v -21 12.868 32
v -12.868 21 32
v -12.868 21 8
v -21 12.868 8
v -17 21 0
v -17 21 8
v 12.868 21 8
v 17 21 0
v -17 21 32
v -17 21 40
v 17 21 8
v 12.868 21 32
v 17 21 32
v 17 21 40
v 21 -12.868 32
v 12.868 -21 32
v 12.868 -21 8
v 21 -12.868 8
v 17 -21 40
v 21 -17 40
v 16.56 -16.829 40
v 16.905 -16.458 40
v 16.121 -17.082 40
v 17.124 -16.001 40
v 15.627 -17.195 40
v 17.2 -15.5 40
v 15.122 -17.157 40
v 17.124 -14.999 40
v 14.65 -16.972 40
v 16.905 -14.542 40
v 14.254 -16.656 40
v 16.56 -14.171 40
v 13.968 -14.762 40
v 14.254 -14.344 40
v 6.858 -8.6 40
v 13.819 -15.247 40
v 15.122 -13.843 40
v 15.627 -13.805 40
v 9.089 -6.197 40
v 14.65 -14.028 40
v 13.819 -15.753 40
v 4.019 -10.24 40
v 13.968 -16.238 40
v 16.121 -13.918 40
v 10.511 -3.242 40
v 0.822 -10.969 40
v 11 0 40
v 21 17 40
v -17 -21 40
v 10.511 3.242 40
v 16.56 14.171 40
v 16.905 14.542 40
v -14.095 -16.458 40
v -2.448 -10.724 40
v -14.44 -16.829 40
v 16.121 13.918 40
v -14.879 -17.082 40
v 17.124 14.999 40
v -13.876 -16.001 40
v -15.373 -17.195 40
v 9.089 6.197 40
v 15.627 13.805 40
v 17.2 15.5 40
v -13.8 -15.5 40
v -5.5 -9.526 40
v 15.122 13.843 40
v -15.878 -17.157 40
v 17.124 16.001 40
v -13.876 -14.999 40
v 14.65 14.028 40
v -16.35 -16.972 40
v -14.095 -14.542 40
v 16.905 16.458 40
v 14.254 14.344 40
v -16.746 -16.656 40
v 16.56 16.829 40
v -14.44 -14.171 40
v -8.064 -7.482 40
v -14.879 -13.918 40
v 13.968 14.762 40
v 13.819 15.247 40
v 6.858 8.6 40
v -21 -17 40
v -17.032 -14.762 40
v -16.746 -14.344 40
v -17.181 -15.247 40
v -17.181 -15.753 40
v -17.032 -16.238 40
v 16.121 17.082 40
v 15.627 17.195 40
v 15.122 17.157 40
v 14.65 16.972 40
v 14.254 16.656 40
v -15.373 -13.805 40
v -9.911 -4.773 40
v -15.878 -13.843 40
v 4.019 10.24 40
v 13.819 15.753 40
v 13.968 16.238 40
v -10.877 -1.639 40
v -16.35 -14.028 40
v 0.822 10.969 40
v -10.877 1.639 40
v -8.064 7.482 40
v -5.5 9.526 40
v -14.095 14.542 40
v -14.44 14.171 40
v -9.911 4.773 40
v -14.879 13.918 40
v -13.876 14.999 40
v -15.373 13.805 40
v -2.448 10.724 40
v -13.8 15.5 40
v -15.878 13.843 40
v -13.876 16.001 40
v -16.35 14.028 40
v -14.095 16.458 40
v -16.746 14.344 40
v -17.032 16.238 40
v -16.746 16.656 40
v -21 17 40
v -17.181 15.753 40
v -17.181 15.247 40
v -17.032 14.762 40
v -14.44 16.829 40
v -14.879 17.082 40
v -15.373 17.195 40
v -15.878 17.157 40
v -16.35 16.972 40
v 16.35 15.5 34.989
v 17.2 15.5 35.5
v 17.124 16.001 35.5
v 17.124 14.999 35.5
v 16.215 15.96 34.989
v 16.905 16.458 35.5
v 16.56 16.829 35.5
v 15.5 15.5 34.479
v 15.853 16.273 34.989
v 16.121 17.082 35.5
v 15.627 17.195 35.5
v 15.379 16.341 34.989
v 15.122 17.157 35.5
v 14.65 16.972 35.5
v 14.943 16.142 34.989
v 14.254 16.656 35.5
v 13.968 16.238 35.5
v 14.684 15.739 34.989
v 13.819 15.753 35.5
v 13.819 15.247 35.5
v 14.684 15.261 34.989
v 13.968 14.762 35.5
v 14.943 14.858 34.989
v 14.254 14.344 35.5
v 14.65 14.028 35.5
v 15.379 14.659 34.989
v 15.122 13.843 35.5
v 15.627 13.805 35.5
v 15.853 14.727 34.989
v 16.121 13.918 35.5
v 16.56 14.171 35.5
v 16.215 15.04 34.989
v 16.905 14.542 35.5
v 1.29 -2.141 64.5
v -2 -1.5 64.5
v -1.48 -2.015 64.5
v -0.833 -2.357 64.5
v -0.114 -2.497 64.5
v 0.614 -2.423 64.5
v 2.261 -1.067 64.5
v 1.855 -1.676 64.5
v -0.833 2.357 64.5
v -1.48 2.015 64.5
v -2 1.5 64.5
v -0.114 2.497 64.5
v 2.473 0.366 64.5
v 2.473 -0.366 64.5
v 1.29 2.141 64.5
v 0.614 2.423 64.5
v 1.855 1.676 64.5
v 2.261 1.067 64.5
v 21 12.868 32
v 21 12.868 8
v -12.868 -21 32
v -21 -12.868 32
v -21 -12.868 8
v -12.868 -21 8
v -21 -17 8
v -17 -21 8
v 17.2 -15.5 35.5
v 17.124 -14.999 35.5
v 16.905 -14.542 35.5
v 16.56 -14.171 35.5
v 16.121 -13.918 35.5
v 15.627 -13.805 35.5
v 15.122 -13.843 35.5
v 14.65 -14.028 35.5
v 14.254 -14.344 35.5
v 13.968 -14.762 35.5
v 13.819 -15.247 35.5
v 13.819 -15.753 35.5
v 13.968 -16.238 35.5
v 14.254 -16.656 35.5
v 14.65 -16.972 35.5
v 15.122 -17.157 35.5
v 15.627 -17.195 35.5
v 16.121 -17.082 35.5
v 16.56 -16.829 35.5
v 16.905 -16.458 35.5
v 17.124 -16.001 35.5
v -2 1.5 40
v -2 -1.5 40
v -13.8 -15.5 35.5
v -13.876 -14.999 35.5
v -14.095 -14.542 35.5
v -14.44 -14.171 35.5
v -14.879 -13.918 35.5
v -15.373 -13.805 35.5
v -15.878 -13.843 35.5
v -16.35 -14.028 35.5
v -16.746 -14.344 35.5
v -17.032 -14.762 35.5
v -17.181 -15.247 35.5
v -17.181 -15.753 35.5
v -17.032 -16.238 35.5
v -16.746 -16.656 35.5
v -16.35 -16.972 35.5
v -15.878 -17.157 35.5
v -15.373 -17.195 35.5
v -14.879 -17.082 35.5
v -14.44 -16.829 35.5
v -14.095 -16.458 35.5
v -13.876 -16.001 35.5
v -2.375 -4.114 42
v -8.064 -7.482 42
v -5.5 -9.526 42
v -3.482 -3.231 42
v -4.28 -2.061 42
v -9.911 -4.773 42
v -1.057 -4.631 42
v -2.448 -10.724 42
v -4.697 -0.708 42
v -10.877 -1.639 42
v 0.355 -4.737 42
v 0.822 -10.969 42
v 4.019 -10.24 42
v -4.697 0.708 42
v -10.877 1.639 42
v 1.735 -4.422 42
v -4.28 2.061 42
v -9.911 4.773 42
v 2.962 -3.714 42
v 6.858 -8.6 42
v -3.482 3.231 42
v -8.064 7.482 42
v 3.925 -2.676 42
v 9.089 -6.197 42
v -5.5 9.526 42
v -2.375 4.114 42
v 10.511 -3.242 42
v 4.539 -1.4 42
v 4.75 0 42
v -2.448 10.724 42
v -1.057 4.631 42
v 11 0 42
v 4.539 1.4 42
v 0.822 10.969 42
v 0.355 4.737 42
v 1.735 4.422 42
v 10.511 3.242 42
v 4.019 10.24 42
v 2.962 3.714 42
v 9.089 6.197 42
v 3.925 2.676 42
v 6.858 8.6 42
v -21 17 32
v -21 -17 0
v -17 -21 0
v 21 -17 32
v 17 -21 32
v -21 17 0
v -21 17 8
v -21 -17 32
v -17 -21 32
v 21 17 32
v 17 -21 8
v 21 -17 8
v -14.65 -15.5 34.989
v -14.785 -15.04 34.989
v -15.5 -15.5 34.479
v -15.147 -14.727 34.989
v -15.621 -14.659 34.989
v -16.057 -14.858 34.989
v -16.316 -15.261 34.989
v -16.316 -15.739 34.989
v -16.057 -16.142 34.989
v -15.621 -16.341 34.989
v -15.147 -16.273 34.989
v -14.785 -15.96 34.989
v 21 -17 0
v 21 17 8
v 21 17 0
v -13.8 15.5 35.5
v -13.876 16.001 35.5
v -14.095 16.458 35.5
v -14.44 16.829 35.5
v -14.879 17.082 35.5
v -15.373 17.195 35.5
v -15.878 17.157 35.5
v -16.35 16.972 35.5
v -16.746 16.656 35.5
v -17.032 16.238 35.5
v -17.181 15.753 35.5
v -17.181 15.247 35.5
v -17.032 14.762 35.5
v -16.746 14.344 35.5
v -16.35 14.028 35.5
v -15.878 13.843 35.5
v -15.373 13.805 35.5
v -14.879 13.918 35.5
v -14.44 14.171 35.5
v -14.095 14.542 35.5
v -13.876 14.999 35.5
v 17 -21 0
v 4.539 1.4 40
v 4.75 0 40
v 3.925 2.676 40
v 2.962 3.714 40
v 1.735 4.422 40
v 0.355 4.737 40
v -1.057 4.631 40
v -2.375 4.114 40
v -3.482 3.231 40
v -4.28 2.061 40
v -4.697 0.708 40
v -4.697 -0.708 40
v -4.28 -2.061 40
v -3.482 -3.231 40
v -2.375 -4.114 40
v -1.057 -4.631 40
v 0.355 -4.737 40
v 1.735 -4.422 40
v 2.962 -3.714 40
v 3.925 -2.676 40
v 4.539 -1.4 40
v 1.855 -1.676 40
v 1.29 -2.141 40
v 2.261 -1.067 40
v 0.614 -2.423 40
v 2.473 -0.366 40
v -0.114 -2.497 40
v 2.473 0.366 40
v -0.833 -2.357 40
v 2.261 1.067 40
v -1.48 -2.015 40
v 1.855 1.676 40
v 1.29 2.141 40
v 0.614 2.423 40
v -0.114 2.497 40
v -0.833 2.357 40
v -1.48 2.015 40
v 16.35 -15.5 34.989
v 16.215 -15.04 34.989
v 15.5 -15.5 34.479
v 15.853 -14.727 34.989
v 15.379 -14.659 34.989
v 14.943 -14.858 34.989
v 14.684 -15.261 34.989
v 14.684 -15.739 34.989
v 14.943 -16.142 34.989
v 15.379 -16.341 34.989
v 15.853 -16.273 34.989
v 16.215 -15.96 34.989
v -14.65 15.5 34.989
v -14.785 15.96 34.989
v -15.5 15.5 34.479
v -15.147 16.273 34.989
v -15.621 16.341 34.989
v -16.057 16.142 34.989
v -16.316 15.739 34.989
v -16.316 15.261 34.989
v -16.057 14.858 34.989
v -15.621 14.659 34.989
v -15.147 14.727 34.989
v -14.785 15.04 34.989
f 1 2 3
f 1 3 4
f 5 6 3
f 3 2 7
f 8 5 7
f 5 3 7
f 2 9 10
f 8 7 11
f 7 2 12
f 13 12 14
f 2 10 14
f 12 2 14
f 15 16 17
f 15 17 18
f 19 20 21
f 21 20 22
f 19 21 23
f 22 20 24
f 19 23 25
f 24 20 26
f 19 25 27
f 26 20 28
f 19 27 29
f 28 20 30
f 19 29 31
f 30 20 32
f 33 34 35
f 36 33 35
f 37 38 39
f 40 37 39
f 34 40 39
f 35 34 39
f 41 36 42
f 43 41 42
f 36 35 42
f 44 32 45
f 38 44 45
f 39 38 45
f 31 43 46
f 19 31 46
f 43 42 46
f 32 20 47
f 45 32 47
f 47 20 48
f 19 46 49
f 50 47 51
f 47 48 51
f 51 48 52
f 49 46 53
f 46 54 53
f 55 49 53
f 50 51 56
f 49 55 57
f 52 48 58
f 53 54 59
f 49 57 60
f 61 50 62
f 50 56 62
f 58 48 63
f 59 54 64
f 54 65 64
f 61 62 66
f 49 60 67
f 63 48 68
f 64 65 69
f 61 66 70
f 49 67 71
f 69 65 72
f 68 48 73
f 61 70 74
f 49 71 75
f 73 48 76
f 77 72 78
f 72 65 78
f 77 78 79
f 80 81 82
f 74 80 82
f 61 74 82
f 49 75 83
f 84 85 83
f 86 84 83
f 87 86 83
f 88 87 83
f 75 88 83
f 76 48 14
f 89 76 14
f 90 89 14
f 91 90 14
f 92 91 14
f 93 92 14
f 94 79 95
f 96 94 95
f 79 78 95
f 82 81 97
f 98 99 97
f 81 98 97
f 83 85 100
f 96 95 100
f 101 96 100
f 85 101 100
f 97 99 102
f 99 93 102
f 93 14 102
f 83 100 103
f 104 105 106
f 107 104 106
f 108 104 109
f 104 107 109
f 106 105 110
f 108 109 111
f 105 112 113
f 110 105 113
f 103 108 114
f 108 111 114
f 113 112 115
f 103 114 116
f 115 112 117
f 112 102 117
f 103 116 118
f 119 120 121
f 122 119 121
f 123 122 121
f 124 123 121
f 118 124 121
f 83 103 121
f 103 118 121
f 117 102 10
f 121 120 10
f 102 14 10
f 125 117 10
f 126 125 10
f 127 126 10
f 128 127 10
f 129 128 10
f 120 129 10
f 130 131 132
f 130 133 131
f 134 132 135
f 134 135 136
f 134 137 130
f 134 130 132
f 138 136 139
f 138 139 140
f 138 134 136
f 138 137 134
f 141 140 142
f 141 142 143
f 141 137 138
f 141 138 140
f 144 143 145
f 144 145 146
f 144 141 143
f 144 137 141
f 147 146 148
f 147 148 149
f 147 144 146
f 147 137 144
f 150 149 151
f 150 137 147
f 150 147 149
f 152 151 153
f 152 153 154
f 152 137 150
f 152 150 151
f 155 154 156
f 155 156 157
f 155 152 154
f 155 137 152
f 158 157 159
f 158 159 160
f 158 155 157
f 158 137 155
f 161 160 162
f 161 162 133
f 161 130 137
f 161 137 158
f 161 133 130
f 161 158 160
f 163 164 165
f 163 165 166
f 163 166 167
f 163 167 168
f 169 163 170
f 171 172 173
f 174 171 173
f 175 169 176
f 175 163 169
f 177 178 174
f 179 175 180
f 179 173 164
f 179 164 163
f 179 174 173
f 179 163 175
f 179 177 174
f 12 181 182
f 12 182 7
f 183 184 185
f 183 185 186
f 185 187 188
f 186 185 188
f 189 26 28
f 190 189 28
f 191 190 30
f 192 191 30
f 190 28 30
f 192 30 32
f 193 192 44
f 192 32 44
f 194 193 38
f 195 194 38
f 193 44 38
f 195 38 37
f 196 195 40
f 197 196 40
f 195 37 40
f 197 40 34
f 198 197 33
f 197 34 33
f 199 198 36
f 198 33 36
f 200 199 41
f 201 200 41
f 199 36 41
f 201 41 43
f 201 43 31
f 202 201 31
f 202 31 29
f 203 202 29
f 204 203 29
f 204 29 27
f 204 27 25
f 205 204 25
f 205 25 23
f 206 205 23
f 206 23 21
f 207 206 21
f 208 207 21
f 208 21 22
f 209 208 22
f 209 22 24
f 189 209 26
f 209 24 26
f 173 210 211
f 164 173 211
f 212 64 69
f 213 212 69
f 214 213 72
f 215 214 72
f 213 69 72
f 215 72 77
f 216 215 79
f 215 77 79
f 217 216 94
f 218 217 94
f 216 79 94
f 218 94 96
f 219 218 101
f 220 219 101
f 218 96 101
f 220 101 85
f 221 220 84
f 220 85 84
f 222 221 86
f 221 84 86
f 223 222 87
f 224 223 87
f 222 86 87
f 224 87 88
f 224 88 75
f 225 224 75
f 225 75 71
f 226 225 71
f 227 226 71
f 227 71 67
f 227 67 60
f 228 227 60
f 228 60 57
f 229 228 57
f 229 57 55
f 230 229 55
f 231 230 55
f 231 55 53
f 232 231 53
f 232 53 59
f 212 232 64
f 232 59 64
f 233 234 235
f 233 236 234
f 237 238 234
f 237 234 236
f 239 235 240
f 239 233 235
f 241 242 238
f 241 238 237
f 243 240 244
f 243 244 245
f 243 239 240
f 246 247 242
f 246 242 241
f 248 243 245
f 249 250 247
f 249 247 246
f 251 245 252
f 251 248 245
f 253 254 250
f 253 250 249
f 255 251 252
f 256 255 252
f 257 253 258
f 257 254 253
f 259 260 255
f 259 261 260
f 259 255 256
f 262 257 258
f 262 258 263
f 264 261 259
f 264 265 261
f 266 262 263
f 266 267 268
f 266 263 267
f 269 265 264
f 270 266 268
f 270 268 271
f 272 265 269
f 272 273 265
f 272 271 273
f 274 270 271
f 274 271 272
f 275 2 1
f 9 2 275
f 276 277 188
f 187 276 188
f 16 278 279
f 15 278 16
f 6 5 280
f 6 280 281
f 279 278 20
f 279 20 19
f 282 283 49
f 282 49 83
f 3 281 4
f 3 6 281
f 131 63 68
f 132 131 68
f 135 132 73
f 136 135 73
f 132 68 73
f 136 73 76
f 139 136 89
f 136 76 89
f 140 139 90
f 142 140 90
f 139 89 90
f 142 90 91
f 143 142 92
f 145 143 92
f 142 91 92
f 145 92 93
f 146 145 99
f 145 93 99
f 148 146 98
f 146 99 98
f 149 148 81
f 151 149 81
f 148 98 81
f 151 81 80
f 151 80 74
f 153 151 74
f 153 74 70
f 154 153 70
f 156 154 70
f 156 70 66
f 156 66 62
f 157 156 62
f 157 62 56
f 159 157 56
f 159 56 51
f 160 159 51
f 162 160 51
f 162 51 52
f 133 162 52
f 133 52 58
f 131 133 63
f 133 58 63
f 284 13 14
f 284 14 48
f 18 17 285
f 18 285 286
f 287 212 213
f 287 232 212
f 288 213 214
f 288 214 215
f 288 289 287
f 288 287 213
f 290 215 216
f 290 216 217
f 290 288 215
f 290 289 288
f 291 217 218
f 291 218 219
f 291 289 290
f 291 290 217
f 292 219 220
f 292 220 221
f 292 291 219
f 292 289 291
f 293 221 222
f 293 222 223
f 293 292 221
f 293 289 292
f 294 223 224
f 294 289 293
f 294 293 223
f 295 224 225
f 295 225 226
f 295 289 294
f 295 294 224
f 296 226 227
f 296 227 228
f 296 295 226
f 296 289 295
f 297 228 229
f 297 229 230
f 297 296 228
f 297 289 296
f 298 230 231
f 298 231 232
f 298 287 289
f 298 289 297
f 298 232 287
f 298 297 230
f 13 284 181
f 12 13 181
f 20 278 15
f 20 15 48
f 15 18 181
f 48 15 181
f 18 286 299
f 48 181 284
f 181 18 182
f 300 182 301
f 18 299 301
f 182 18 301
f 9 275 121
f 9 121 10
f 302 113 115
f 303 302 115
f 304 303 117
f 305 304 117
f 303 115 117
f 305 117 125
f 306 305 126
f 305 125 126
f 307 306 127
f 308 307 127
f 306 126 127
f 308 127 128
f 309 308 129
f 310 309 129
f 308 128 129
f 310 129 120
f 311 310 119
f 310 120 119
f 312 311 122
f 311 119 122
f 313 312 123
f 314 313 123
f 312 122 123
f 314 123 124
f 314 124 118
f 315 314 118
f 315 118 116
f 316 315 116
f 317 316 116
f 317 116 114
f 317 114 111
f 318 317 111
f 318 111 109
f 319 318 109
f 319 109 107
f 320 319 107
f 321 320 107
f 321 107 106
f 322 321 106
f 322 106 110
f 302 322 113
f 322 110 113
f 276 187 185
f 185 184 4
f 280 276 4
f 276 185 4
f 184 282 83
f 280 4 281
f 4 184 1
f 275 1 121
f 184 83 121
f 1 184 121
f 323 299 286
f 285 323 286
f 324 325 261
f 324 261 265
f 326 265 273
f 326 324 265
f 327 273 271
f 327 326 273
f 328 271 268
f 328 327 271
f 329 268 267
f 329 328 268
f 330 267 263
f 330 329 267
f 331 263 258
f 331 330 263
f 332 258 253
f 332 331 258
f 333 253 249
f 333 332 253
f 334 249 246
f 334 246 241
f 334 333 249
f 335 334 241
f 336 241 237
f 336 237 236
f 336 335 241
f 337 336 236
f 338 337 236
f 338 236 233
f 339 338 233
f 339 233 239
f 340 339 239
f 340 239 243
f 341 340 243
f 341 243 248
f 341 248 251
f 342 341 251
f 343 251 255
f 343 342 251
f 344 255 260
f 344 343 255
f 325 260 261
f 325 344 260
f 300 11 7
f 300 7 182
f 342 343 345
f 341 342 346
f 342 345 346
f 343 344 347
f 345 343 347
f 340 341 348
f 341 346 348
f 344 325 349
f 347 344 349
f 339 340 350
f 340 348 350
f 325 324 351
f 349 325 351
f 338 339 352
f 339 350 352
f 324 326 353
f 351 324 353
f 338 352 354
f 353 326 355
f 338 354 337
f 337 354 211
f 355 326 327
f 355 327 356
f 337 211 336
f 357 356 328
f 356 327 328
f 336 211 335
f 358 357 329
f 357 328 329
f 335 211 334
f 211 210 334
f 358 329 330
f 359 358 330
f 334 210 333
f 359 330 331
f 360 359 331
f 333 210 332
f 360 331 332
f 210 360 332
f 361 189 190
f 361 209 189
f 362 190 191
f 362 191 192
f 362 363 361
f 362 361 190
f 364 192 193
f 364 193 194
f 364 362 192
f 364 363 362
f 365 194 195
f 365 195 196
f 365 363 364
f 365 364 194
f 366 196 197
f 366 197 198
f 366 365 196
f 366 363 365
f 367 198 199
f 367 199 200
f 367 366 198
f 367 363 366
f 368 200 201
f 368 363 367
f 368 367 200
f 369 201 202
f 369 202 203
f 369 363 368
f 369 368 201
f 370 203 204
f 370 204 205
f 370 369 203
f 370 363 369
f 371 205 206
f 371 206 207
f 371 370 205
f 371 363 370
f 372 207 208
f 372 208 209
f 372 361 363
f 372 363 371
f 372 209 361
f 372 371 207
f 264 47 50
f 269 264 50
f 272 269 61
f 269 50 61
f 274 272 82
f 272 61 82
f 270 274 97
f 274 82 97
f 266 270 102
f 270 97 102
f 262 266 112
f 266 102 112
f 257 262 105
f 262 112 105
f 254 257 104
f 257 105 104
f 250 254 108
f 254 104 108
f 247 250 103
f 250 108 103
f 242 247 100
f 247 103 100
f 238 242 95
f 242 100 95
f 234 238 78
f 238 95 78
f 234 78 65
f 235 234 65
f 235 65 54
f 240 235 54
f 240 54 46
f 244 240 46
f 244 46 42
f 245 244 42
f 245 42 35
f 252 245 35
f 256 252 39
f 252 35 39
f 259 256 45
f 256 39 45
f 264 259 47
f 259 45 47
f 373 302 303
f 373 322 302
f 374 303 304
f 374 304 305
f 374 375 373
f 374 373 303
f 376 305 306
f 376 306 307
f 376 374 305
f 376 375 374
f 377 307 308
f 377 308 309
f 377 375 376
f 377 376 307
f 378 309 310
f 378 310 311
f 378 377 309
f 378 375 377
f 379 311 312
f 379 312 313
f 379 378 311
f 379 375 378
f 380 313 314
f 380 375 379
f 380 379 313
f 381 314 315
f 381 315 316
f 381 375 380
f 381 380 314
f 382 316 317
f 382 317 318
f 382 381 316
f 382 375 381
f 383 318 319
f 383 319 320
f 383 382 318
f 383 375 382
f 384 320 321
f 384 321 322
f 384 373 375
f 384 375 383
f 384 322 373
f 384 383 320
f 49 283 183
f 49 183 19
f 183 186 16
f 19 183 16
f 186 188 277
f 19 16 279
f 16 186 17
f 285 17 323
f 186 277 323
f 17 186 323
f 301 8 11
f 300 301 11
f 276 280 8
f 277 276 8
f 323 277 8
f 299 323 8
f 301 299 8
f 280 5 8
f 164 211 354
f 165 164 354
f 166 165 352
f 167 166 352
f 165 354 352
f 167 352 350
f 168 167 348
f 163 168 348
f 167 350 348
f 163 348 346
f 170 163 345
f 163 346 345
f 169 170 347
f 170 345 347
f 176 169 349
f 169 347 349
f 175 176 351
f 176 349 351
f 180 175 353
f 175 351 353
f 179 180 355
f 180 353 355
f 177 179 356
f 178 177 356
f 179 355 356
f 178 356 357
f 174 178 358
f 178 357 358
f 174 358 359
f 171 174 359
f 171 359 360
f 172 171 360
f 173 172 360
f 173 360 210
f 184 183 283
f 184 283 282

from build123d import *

# Parameters (mm, degrees)
SKETCH_W      = 42
SKETCH_H      = 42
PAD_DEPTH     = 40
CHAMFER_SIZE  = 4
SKETCH001_W   = 44
SKETCH001_H   = 44
POCKET_DEPTH  = 32
PAD001_DEPTH  = 8
SKETCH003_R   = 11
SKETCH003_R_2 = 4.75
PAD002_DEPTH  = 2
PAD003_DEPTH  = 24.5
SKETCH005_R   = 1.7
HOLE_DEPTH    = 4.5
HOLE_TIPS_R   = 1.7


with BuildPart() as part:
    # Sketch → Pad (new body)
    with BuildSketch(Plane.XY):
        Rectangle(SKETCH_W, SKETCH_H)
    extrude(amount=PAD_DEPTH)

    # Chamfer
    chamfer_edges = [part.edges().sort_by_distance(p)[0] for p in [
        (21, -21, 20),
        (-21, -21, 20),
        (21, 21, 20),
        (-21, 21, 20),
    ]]
    chamfer(chamfer_edges, length=CHAMFER_SIZE)

    # Sketch001 (on Face5 of Chamfer) → Pocket (cut)
    with BuildSketch(Plane.XY.offset(40)):
        Rectangle(SKETCH001_W, SKETCH001_H)
        Polygon((-21, -12.868272), (-12.868272, -21), (12.868272, -21), (21, -12.868272), (21, 12.868272), (12.868272, 21), (-12.868272, 21), (-21, 12.868272), align=None, mode=Mode.SUBTRACT)
    extrude(amount=-POCKET_DEPTH, mode=Mode.SUBTRACT)

    # Sketch002 (on Face9 of Pocket) → Pad001 (join)
    with BuildSketch(Plane.XY.offset(40)):
        Polygon((-17, 21), (17, 21), (21, 17), (21, -17), (17, -21), (-17, -21), (-21, -17), (-21, 17), align=None)
    extrude(amount=-PAD001_DEPTH)

    # Sketch003 (on Face26 of Pad001) → Pad002 (join)
    with BuildSketch(Plane.XY.offset(40)):
        Circle(SKETCH003_R)
        Circle(SKETCH003_R_2, mode=Mode.SUBTRACT)
    extrude(amount=PAD002_DEPTH)

    # Sketch004 (on Face14 of Pad002) → Pad003 (join)
    with BuildSketch(Plane.XY.offset(40)):
        with BuildLine():
            ThreePointArc((-2, -1.5), (2.5, 0), (-2, 1.5))
            Line((-2, 1.5), (-2, -1.5))
        make_face()
    extrude(amount=PAD003_DEPTH)

    # Sketch005 (on Face14 of Pad003) → Hole (cut)
    with BuildSketch(Plane.XY.offset(40)):
        with Locations((-15.5, 15.5)):
            Circle(SKETCH005_R)
        with Locations((15.5, 15.5)):
            Circle(SKETCH005_R)
        with Locations((15.5, -15.5)):
            Circle(SKETCH005_R)
        with Locations((-15.5, -15.5)):
            Circle(SKETCH005_R)
    extrude(amount=-HOLE_DEPTH, mode=Mode.SUBTRACT)

    # Hole tips → Hole tip 1 section 0
    with BuildSketch(Plane.XY.offset(35.5), mode=Mode.PRIVATE) as hole_tip_1_s0:
        with Locations((-15.5, 15.5)):
            Circle(HOLE_TIPS_R)
    loft([hole_tip_1_s0.sketch, Vertex(-15.5, 15.5, 34.478537)], mode=Mode.SUBTRACT)

    # Hole tips → Hole tip 2 section 0
    with BuildSketch(Plane.XY.offset(35.5), mode=Mode.PRIVATE) as hole_tip_2_s0:
        with Locations((15.5, 15.5)):
            Circle(HOLE_TIPS_R)
    loft([hole_tip_2_s0.sketch, Vertex(15.5, 15.5, 34.478537)], mode=Mode.SUBTRACT)

    # Hole tips → Hole tip 3 section 0
    with BuildSketch(Plane.XY.offset(35.5), mode=Mode.PRIVATE) as hole_tip_3_s0:
        with Locations((15.5, -15.5)):
            Circle(HOLE_TIPS_R)
    loft([hole_tip_3_s0.sketch, Vertex(15.5, -15.5, 34.478537)], mode=Mode.SUBTRACT)

    # Hole tips → Hole tip 4 section 0
    with BuildSketch(Plane.XY.offset(35.5), mode=Mode.PRIVATE) as hole_tip_4_s0:
        with Locations((-15.5, -15.5)):
            Circle(HOLE_TIPS_R)
    loft([hole_tip_4_s0.sketch, Vertex(-15.5, -15.5, 34.478537)], mode=Mode.SUBTRACT)


solid = part.part
